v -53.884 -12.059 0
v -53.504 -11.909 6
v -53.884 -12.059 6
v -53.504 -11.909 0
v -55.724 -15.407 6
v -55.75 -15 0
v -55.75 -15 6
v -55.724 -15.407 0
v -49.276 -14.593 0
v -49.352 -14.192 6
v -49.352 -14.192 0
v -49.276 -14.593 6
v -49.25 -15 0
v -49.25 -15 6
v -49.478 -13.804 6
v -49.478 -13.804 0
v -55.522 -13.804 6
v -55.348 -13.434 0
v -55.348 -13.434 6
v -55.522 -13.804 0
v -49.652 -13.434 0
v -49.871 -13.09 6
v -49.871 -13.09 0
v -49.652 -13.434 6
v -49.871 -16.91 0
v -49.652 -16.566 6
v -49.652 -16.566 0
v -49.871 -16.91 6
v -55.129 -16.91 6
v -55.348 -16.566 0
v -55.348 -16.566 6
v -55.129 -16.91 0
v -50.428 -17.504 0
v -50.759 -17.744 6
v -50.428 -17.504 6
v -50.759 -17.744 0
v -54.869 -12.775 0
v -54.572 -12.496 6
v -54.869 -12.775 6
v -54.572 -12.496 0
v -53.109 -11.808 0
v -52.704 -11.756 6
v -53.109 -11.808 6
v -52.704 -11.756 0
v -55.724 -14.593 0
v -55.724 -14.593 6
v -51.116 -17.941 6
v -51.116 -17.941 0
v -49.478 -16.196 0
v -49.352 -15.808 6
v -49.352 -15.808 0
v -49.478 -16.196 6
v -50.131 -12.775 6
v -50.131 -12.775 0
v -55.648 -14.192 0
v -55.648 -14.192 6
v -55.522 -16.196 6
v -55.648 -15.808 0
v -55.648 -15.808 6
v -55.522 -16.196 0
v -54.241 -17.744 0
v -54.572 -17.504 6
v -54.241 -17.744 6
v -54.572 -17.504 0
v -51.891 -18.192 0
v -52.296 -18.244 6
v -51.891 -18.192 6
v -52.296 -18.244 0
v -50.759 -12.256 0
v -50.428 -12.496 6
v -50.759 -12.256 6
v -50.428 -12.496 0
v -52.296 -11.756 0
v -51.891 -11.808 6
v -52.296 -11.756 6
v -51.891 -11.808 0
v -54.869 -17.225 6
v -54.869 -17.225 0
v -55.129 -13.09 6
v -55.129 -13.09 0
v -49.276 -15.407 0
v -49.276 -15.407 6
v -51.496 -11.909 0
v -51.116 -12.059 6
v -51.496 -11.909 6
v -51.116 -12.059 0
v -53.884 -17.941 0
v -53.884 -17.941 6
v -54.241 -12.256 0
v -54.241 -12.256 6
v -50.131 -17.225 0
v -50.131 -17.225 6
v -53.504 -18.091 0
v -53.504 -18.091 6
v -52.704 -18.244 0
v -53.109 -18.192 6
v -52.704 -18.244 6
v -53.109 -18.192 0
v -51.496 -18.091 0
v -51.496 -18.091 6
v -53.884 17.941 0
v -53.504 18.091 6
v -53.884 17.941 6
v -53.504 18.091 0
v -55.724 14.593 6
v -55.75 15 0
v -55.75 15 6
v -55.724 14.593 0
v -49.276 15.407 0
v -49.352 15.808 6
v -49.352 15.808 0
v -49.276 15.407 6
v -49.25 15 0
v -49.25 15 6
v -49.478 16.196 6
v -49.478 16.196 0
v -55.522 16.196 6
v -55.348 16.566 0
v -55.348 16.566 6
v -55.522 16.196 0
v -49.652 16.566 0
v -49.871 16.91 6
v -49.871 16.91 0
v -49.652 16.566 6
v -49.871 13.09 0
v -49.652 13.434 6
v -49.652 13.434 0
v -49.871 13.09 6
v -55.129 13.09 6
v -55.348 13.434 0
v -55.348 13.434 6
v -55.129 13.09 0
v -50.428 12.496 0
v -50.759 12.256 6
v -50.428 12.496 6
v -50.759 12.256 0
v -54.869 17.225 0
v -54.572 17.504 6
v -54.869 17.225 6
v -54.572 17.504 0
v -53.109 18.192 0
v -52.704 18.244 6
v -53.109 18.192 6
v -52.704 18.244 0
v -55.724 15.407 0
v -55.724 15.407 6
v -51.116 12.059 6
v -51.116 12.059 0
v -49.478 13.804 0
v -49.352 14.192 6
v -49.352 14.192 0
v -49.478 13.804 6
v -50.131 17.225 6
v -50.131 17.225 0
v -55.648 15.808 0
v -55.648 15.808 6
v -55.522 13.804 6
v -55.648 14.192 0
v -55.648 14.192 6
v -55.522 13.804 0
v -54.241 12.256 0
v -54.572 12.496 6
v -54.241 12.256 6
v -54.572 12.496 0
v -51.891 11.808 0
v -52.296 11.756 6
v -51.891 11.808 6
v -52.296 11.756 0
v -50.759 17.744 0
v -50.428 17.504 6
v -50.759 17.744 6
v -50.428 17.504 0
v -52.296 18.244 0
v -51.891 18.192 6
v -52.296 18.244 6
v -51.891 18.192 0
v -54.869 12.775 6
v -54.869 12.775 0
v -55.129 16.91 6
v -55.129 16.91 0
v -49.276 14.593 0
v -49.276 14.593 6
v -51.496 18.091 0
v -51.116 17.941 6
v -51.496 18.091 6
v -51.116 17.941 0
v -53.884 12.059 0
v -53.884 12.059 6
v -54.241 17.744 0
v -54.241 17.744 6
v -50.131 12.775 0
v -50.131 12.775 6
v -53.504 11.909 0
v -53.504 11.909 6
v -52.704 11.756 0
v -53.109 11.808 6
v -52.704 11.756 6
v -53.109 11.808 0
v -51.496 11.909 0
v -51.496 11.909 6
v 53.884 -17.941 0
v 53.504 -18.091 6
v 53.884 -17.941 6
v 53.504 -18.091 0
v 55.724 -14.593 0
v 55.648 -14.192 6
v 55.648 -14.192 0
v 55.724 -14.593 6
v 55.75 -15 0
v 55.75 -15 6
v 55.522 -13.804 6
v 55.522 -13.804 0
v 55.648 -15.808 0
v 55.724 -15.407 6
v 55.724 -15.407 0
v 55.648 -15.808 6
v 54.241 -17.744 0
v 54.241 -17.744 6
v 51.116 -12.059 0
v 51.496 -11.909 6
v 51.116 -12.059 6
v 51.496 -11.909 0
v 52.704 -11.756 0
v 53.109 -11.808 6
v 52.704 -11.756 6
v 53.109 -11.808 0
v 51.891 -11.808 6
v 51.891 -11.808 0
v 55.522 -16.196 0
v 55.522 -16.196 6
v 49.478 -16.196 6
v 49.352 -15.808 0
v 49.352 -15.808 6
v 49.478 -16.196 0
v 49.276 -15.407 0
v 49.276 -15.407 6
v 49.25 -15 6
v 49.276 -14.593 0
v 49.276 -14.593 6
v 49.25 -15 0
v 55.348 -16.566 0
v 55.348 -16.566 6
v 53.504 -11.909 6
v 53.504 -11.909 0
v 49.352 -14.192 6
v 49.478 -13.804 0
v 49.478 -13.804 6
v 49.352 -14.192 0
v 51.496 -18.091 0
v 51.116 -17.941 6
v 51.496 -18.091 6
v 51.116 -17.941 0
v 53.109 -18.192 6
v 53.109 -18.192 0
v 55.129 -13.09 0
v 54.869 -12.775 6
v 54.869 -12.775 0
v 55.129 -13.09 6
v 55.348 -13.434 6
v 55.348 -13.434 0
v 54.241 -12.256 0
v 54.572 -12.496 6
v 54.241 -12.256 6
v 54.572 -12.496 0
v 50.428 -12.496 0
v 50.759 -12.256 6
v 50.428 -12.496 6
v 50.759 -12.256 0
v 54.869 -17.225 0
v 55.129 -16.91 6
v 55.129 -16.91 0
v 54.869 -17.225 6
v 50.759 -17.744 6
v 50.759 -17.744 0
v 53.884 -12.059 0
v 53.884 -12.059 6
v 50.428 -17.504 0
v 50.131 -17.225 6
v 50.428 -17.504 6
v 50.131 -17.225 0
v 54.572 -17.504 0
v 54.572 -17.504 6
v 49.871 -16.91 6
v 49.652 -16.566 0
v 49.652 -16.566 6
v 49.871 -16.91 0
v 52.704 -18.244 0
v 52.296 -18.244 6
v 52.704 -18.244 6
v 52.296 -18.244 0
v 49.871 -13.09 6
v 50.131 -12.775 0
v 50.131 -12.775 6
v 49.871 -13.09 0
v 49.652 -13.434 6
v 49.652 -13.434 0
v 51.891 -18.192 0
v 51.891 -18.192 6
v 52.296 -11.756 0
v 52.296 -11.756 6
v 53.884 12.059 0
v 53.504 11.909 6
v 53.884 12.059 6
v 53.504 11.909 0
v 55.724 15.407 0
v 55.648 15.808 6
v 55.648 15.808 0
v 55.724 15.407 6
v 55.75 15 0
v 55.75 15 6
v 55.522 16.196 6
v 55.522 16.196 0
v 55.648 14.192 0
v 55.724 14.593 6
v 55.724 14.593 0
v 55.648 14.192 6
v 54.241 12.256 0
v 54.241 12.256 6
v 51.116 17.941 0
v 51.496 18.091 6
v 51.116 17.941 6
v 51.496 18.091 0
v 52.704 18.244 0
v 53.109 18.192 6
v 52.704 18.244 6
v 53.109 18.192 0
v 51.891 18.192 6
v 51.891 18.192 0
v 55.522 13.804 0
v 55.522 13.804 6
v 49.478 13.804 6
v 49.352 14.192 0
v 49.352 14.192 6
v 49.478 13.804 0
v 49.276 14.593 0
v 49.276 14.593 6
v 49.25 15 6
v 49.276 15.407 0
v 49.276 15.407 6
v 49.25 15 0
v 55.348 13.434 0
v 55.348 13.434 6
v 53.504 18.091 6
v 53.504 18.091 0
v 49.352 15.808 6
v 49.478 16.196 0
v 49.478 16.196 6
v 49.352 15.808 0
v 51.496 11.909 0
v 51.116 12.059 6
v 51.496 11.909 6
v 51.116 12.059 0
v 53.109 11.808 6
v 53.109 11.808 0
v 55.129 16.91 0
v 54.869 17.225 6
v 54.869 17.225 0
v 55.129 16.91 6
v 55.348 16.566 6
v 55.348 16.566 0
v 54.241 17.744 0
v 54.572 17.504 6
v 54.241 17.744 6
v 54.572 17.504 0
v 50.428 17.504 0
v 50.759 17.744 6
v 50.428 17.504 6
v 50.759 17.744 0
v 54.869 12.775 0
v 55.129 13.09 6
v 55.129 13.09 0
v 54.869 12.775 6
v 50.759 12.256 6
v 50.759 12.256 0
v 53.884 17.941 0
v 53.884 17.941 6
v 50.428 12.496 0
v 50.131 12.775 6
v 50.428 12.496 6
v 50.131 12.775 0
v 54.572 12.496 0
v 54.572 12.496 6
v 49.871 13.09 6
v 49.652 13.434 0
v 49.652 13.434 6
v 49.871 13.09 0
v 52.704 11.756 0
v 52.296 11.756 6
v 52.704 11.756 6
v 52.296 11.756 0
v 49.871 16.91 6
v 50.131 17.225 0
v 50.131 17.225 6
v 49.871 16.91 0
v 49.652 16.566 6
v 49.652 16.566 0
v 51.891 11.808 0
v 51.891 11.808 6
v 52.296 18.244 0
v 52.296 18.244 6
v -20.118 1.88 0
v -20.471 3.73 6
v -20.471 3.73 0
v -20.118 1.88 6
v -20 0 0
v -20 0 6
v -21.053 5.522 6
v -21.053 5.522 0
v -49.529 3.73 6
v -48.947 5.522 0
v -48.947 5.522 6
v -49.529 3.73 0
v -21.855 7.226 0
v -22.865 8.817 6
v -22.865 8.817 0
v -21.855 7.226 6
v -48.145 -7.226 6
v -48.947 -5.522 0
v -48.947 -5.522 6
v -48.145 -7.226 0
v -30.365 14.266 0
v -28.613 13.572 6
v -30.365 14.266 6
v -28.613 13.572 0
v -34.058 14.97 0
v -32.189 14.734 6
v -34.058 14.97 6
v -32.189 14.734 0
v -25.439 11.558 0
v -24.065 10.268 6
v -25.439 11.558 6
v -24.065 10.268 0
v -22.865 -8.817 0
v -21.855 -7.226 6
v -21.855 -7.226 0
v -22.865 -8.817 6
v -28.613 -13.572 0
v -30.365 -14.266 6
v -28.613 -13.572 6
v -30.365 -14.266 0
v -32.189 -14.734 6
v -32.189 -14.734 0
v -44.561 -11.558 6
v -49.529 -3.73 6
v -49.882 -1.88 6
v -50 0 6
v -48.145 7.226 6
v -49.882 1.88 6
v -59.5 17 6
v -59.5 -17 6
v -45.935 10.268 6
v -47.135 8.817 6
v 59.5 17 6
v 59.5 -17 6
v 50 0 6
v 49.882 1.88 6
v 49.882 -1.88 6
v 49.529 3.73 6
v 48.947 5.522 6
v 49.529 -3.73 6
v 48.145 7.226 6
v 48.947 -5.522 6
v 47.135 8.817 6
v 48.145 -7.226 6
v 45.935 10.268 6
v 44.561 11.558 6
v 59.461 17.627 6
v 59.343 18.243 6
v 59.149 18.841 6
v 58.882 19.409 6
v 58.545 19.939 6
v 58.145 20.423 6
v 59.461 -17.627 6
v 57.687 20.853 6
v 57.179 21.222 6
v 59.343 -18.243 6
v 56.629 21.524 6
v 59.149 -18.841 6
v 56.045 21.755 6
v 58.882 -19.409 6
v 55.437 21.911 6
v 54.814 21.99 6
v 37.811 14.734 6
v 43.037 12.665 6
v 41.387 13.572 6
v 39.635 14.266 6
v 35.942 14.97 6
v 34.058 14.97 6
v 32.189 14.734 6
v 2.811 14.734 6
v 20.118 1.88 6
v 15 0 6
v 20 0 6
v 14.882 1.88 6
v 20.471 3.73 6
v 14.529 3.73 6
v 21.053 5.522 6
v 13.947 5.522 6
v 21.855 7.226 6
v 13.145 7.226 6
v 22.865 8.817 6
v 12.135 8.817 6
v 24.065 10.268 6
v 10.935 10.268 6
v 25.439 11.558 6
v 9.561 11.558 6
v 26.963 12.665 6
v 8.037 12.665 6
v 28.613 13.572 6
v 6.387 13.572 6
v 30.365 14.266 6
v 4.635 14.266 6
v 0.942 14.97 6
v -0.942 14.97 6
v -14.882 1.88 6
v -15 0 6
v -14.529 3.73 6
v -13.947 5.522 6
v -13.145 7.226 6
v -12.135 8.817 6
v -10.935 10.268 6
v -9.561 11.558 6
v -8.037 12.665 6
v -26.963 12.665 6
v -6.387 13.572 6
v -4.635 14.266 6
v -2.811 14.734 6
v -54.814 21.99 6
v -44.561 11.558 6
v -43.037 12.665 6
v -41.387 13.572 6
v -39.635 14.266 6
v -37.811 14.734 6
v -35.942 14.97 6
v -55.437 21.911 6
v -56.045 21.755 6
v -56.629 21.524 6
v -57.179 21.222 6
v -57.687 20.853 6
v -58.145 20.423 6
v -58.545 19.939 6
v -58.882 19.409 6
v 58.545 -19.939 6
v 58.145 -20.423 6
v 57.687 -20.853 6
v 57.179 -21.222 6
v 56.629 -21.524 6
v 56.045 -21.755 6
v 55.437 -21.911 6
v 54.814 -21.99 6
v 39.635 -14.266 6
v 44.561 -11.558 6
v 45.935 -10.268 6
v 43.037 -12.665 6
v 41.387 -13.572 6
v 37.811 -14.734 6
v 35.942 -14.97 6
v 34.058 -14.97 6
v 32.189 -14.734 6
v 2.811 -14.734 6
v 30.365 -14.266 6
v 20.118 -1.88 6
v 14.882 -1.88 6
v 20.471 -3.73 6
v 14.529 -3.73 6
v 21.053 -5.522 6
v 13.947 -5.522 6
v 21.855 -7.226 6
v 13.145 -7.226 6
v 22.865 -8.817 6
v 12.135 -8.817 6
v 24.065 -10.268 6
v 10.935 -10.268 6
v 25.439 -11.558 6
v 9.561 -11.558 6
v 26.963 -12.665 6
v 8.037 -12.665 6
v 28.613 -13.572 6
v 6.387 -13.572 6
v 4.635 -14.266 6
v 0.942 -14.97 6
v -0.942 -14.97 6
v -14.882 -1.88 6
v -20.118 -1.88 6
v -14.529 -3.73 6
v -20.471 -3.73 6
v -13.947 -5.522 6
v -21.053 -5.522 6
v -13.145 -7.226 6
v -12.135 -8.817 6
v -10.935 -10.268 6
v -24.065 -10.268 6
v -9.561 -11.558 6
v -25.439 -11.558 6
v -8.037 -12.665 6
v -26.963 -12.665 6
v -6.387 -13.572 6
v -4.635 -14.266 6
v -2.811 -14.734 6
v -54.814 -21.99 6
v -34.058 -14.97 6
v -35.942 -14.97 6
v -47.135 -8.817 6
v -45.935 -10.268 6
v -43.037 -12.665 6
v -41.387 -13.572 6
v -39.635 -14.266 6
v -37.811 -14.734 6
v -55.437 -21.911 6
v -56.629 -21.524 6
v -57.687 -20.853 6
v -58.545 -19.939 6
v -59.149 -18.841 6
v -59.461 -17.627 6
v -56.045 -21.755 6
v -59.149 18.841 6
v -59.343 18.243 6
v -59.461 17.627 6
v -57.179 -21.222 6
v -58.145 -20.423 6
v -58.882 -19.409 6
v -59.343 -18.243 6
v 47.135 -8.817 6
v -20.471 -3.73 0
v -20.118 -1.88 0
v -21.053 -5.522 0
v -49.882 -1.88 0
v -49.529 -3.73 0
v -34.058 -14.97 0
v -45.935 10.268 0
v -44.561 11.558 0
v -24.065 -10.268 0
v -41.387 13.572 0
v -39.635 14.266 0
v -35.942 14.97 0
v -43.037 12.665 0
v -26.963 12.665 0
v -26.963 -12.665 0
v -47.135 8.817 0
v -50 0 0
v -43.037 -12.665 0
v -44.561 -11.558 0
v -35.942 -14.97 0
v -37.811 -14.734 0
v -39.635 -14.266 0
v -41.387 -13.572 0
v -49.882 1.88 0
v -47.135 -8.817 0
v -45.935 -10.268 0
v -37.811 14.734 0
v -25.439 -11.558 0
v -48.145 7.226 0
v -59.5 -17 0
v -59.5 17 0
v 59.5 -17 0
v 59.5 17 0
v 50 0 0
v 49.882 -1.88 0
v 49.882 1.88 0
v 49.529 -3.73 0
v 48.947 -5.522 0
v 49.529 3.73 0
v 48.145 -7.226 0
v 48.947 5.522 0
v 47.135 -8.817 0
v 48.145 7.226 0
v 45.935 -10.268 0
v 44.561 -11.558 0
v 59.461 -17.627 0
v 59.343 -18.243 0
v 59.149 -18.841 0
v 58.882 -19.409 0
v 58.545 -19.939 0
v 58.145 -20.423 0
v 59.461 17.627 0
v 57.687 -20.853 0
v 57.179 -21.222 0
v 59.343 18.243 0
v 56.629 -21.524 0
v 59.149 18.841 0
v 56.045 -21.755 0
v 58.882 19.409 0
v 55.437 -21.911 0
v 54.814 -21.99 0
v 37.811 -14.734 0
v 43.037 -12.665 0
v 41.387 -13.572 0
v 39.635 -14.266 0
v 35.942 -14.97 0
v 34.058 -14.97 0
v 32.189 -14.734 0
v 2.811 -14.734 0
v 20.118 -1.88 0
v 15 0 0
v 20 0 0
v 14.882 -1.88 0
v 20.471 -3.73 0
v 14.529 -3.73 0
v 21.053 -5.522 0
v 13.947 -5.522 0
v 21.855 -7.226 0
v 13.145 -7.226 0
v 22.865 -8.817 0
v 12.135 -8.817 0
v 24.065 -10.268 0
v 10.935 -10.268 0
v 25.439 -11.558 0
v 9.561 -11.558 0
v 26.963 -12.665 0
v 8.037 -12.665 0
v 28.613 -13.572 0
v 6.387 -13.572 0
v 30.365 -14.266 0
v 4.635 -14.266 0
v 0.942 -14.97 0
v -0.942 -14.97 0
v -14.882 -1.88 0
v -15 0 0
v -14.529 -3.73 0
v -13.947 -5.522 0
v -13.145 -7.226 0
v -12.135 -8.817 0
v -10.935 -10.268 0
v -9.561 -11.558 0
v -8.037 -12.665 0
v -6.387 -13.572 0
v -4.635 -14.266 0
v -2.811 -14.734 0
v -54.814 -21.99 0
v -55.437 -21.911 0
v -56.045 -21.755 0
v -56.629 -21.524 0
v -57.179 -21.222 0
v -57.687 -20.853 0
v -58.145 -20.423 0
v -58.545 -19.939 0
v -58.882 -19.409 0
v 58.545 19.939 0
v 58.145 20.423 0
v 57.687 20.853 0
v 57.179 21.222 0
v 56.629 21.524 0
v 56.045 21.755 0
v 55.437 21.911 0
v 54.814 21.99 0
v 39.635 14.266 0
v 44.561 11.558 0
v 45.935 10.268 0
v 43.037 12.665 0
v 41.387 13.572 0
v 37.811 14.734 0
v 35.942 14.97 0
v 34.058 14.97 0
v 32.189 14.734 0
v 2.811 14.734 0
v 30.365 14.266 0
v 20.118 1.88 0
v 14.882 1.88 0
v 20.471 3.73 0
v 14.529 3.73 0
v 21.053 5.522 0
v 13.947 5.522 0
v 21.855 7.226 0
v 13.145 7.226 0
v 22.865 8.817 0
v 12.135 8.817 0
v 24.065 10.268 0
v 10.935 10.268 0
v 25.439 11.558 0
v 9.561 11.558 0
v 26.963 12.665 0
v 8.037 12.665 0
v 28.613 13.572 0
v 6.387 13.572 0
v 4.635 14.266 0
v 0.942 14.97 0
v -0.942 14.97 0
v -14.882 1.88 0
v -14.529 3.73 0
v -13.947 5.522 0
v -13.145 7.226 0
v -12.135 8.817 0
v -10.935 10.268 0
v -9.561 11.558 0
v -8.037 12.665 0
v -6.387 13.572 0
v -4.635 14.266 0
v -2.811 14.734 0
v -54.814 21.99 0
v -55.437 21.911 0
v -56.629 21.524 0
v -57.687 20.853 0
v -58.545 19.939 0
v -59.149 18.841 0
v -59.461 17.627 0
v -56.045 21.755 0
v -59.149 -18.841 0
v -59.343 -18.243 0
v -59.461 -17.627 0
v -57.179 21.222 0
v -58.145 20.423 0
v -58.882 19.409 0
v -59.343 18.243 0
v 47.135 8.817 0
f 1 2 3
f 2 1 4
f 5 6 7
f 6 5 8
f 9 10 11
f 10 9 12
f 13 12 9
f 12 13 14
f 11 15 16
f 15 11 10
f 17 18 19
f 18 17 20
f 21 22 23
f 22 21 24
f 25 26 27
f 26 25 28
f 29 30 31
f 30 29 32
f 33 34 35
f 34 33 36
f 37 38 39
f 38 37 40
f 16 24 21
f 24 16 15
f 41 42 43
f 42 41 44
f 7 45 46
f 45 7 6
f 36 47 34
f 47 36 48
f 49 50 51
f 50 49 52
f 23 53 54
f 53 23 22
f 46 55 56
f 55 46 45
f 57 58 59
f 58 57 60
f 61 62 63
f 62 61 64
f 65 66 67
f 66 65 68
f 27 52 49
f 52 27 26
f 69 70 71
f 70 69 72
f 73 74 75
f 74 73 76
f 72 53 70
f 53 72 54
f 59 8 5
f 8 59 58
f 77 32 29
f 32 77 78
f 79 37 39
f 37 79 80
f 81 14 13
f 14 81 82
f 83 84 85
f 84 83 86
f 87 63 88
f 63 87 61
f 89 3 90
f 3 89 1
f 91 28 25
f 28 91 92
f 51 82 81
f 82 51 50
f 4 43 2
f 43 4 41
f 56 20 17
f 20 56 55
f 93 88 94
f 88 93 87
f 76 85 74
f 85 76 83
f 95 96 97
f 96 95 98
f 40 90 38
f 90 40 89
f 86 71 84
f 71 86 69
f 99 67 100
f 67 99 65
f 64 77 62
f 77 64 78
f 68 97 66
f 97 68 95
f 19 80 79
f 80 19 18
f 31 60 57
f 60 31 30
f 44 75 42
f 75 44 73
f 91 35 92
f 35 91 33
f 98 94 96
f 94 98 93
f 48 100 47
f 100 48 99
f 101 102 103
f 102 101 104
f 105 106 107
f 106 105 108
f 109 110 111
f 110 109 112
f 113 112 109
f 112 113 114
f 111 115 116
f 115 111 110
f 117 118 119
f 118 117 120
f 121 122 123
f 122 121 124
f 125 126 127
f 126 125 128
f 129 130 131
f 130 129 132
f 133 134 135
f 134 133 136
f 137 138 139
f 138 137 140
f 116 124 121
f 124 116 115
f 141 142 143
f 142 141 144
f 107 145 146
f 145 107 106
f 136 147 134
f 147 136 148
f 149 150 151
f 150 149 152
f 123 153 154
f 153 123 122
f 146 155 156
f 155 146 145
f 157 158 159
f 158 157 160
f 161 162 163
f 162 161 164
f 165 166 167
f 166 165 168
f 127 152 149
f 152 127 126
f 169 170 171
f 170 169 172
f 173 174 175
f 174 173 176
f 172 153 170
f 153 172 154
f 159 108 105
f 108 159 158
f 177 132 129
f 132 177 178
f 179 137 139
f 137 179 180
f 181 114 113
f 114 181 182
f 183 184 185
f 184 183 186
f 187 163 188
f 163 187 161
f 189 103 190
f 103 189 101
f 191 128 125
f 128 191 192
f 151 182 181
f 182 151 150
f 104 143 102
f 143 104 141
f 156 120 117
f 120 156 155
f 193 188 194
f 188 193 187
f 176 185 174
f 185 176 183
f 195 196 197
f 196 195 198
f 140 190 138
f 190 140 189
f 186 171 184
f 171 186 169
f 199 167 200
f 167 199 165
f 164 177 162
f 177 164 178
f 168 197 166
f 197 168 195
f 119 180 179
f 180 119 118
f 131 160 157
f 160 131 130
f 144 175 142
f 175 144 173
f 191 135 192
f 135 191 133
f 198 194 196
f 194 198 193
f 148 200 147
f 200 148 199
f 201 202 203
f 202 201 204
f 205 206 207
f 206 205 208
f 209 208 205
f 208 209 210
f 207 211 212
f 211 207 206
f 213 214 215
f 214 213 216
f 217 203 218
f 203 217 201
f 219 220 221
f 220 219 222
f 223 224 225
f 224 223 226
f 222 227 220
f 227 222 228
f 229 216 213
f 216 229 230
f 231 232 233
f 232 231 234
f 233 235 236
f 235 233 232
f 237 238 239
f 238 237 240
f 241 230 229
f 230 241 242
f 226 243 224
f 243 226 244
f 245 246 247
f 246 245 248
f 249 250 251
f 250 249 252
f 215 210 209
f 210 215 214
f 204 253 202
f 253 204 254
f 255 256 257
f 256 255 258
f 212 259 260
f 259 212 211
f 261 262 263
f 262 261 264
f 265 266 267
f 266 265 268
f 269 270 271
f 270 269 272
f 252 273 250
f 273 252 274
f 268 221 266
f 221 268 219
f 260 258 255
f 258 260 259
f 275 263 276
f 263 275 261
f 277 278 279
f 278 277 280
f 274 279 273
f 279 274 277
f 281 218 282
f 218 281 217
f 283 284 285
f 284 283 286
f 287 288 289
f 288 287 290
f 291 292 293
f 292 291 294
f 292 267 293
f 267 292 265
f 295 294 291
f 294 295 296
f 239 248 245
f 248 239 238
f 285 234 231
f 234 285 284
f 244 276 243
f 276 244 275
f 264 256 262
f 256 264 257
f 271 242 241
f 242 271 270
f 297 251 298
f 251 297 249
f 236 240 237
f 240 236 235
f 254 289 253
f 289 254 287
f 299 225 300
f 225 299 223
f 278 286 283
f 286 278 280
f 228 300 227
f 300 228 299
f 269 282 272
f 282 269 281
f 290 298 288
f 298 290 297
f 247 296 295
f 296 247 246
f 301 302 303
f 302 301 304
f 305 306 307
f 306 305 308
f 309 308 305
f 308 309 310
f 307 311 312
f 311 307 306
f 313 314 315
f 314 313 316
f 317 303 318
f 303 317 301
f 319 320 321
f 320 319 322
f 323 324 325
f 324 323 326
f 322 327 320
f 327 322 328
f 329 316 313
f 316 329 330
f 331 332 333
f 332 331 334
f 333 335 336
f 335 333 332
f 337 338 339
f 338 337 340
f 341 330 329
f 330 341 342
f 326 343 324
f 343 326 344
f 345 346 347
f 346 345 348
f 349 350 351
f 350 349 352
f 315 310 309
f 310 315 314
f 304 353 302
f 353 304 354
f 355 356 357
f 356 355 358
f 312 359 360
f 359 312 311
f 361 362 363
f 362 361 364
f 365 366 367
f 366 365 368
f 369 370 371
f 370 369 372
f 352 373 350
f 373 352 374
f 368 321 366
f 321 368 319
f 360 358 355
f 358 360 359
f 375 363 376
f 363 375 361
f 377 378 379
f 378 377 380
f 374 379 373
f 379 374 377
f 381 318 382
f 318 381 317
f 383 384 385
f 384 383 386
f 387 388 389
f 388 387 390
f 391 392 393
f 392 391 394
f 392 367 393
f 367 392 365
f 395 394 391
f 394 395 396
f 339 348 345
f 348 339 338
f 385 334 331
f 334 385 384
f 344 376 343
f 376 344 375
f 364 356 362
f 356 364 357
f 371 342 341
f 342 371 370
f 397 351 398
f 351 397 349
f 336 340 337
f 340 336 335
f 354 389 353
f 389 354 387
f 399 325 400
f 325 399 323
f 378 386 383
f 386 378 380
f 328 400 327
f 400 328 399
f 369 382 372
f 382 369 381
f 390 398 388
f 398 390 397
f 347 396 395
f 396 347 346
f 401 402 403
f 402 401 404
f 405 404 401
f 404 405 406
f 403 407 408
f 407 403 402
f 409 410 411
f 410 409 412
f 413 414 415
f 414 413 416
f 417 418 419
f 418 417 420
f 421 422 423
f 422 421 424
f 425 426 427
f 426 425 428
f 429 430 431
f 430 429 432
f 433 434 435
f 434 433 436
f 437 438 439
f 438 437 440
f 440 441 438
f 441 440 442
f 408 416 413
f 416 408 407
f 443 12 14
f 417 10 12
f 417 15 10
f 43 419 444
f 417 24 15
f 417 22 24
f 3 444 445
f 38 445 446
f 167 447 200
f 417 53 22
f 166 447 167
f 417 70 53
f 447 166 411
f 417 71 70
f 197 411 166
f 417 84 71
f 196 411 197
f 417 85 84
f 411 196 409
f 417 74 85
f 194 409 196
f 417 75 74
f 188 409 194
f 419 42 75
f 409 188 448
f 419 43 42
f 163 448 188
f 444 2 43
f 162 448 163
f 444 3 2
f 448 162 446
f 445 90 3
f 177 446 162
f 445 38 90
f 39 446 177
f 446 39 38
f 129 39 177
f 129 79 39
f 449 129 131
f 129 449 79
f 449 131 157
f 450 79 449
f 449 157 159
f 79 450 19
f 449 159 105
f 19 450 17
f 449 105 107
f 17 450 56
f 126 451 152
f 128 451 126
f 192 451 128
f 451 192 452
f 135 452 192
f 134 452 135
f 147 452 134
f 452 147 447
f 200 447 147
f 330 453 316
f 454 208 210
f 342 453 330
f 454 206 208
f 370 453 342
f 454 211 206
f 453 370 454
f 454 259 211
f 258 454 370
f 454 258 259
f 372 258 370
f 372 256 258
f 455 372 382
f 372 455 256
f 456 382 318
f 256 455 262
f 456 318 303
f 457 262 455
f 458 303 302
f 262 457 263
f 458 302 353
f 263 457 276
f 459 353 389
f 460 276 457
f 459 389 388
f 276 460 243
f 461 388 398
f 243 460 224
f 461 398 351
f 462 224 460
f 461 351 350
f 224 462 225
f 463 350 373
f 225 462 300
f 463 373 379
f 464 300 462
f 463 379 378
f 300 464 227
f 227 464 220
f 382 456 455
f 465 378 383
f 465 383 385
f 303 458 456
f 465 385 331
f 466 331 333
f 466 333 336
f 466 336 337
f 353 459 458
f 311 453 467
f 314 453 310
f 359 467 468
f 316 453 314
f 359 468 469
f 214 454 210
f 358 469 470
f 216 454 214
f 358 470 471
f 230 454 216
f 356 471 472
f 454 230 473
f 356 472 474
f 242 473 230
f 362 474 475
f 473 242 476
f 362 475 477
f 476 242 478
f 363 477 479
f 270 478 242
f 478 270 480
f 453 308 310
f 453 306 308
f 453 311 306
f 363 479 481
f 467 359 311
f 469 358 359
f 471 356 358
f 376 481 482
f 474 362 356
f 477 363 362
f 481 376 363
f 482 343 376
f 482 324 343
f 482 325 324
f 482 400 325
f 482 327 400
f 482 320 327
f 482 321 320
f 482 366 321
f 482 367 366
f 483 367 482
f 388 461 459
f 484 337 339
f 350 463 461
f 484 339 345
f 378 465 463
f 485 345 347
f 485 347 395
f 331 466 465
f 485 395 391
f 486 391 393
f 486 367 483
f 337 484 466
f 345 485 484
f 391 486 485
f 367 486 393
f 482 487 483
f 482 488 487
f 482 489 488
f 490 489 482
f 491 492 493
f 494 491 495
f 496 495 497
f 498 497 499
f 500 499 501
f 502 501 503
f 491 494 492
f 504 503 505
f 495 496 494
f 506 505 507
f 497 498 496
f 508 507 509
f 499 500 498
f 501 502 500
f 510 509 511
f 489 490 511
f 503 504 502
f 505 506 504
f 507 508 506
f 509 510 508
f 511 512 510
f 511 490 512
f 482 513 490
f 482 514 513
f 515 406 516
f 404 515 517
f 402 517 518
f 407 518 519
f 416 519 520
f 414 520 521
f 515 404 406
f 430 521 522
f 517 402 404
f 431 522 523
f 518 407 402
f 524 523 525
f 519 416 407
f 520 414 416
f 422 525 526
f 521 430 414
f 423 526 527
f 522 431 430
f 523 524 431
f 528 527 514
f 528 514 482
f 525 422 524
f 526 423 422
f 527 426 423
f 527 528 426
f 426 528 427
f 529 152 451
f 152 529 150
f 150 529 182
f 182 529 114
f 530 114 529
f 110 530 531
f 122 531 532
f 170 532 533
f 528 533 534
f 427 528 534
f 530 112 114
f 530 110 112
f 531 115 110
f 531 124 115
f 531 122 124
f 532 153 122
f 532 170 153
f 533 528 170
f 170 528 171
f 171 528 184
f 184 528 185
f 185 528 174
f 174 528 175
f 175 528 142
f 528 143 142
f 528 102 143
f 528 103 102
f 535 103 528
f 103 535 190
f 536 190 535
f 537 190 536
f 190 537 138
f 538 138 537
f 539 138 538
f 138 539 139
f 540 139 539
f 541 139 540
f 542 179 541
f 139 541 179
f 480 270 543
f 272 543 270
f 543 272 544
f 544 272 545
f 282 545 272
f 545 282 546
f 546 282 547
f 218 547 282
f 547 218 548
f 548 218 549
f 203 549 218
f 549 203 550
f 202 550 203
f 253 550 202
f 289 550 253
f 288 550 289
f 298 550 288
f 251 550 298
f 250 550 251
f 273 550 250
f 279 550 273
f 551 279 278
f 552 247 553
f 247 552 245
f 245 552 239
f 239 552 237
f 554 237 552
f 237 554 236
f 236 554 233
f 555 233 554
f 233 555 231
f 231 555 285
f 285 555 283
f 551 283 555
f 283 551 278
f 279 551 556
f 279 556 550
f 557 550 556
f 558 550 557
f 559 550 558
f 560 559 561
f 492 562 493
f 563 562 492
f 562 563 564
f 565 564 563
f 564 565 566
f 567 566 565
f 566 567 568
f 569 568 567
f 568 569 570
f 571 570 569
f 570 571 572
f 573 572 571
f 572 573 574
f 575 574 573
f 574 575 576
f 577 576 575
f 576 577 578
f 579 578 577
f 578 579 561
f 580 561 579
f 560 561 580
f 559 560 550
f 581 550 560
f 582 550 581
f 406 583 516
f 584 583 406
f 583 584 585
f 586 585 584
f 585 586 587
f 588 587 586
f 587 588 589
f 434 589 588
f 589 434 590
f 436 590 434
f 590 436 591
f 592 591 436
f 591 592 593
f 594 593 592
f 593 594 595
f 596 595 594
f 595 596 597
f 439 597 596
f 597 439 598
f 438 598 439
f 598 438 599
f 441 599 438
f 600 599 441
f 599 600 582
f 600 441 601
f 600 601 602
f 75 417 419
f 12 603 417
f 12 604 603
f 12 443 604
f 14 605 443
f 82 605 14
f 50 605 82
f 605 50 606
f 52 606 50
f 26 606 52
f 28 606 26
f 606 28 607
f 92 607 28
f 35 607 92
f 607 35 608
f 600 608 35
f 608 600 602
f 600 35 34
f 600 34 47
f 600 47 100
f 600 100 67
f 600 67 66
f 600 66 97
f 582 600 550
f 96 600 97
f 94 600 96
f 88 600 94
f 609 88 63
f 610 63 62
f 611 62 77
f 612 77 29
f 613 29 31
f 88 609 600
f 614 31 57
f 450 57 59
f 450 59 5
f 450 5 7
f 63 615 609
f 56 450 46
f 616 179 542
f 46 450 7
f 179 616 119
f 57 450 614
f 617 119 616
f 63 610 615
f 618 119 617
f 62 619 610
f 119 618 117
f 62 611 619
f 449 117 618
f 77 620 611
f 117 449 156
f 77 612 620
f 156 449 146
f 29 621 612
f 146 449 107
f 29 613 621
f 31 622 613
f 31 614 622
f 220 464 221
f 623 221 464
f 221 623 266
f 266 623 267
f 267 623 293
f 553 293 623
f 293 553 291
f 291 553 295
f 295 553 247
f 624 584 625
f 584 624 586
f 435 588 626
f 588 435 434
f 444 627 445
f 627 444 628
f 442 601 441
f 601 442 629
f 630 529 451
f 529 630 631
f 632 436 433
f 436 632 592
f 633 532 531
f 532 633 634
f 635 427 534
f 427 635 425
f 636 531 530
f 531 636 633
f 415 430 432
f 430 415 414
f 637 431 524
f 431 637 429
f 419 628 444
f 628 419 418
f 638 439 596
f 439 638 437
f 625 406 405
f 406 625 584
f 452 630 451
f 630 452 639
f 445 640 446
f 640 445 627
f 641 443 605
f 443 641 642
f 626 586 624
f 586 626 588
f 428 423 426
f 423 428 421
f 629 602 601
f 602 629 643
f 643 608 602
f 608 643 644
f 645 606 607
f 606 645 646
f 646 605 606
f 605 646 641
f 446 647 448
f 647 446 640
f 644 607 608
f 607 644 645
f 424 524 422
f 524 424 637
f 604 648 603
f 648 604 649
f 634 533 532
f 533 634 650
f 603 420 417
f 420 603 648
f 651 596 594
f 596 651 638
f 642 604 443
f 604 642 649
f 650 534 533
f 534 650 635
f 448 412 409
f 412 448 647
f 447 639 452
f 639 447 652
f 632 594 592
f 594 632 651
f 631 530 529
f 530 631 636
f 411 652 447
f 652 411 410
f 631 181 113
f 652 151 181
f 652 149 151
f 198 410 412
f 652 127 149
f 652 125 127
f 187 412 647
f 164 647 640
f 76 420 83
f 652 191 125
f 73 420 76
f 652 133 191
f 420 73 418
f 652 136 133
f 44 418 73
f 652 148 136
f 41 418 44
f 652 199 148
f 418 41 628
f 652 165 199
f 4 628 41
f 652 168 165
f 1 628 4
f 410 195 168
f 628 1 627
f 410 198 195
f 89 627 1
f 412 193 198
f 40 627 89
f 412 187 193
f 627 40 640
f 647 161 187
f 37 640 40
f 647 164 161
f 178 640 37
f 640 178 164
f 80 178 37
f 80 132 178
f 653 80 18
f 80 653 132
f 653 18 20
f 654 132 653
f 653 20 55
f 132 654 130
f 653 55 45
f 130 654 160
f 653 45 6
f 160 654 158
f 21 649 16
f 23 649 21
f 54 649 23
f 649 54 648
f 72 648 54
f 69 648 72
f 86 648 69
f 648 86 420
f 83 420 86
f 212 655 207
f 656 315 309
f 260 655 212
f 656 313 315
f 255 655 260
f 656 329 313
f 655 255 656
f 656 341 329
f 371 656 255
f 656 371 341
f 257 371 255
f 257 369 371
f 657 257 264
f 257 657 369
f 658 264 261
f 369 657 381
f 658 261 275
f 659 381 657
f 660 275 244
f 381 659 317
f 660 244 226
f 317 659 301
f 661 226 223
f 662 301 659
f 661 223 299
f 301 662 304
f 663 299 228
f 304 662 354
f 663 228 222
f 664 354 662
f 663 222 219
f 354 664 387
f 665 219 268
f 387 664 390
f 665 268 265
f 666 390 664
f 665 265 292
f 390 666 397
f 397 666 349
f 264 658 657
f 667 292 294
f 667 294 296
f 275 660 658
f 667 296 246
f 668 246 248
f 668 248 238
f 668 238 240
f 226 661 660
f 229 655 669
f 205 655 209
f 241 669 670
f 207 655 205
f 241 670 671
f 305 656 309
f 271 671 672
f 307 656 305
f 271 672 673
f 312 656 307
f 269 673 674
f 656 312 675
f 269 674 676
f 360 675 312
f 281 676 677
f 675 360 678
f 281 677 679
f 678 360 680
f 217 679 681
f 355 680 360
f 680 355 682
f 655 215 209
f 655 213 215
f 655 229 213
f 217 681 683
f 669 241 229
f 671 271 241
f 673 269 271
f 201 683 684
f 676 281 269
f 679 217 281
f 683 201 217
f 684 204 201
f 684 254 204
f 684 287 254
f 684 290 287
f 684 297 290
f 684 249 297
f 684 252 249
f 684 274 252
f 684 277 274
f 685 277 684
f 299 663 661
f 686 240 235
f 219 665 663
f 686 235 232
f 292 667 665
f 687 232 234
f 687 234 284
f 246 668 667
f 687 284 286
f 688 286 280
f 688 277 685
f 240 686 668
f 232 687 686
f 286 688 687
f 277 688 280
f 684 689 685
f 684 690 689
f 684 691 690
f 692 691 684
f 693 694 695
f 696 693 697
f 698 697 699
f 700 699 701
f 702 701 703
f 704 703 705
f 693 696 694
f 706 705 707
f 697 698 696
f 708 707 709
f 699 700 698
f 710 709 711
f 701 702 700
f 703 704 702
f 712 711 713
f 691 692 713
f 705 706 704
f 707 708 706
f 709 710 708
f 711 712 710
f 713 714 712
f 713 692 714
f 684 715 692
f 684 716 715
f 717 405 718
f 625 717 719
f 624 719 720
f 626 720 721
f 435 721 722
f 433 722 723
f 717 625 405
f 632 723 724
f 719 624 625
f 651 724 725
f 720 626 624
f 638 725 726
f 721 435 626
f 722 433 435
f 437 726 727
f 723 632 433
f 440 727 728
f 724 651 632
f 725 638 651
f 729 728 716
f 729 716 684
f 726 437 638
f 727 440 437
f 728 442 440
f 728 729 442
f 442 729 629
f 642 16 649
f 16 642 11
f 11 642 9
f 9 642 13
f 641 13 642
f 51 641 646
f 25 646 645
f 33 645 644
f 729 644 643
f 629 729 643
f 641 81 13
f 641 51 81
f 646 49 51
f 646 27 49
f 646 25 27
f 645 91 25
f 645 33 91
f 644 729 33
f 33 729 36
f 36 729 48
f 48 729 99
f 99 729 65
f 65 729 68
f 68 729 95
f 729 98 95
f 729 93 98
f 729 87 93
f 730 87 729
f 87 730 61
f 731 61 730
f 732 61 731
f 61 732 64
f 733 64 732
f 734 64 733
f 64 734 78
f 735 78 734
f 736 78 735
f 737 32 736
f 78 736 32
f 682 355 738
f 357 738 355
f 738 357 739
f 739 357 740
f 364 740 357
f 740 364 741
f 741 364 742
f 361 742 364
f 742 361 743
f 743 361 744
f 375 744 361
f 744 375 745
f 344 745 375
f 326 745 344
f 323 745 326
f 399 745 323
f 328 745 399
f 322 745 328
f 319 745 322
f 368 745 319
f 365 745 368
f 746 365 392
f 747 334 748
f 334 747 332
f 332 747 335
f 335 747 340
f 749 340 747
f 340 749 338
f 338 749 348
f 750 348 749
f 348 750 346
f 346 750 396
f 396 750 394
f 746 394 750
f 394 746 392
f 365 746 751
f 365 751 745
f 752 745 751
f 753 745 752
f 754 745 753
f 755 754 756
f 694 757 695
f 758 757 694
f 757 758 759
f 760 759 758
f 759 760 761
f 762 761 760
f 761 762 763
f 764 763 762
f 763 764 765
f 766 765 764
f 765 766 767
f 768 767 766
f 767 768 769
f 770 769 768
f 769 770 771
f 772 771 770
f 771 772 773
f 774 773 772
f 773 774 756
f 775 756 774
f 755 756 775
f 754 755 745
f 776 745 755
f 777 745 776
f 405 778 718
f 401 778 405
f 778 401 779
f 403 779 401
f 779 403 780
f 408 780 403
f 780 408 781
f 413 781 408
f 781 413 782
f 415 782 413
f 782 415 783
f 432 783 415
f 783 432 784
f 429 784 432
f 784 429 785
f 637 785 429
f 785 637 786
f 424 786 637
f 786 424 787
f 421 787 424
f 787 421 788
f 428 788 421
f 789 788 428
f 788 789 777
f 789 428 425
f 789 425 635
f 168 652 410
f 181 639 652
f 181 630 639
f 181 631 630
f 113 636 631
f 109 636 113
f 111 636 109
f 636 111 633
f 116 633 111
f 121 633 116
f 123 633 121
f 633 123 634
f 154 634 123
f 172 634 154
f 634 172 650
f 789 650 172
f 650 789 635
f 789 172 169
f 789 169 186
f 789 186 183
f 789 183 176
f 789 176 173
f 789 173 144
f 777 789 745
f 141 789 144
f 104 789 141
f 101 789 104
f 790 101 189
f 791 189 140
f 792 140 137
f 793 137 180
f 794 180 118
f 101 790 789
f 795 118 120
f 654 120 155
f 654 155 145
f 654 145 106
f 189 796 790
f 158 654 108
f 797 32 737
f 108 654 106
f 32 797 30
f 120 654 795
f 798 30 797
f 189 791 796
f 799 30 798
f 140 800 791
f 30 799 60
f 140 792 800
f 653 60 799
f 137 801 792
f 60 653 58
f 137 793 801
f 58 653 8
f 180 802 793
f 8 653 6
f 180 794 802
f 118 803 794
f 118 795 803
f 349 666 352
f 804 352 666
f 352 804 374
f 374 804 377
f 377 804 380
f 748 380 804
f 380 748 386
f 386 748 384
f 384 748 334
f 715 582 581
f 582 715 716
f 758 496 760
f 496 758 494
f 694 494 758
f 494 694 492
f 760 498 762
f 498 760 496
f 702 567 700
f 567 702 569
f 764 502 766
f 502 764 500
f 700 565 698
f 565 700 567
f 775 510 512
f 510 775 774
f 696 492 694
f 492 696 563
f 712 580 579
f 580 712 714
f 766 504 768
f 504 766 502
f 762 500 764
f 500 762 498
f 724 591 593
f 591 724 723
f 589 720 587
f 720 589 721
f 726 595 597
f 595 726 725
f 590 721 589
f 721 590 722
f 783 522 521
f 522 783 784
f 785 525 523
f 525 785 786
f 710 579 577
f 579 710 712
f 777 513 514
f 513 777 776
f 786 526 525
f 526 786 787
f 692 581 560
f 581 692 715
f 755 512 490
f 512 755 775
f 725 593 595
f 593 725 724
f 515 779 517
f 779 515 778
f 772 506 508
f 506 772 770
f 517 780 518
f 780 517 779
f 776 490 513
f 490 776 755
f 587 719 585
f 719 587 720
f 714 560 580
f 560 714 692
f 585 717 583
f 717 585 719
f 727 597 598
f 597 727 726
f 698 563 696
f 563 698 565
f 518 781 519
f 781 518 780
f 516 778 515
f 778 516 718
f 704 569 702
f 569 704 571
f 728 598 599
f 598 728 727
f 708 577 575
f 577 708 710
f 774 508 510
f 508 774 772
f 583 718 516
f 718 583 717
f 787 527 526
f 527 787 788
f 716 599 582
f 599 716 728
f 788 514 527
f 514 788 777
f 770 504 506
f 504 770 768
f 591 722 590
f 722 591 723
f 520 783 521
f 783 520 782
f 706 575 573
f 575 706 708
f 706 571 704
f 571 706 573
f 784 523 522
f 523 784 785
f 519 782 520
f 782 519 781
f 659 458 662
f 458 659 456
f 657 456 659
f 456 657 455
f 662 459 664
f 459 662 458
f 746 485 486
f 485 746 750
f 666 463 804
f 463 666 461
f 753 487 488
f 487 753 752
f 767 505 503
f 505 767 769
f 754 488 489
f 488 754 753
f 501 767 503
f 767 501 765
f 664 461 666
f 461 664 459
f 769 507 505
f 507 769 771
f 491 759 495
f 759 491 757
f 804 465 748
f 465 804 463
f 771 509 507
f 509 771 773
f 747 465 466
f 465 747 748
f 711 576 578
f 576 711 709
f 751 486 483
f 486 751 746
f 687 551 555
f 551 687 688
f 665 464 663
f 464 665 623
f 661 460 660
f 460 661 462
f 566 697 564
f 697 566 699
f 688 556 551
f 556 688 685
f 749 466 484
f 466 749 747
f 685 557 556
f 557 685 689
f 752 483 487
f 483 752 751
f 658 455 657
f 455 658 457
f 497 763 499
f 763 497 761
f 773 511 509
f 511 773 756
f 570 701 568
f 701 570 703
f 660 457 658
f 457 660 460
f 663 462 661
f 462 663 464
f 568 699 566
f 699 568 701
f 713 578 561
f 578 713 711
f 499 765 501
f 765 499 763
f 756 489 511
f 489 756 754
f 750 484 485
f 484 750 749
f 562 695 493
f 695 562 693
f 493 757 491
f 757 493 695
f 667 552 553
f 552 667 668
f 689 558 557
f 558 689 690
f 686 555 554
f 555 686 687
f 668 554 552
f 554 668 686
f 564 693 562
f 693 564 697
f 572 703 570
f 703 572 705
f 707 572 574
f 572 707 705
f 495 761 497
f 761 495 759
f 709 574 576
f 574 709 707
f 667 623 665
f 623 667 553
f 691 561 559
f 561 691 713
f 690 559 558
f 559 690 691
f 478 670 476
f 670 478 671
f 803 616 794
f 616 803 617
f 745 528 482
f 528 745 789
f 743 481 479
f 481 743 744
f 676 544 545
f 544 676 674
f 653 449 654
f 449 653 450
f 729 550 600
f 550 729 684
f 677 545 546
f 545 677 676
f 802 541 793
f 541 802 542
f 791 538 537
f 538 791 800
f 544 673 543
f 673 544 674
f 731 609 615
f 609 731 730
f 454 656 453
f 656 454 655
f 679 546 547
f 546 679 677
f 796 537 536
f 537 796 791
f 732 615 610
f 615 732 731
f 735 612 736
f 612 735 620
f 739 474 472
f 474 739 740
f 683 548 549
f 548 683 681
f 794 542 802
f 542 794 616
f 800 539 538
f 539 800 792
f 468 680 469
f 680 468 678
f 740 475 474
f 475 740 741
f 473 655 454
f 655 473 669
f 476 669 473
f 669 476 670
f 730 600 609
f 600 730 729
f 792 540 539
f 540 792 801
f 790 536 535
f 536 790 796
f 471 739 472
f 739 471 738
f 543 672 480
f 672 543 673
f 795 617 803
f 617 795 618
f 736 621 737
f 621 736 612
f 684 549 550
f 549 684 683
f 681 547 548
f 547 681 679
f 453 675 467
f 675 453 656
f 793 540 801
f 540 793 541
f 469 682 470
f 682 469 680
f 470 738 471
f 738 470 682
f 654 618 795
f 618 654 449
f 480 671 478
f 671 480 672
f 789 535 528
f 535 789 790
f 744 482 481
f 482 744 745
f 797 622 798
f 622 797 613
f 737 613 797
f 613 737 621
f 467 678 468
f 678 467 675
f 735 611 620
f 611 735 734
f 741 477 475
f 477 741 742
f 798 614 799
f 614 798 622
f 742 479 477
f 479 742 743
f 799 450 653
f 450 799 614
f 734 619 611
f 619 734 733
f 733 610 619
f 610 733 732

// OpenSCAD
$fn = 50;

difference() {
	union() {
		hull() {
			translate(v = [-54.5, 17.0, 0]) {
				cylinder(h = 6, r = 5);
			}
			translate(v = [54.5, 17.0, 0]) {
				cylinder(h = 6, r = 5);
			}
			translate(v = [-54.5, -17.0, 0]) {
				cylinder(h = 6, r = 5);
			}
			translate(v = [54.5, -17.0, 0]) {
				cylinder(h = 6, r = 5);
			}
		}
	}
	union() {
		translate(v = [-52.5, -15.0, -100.0]) {
			cylinder(h = 200, r = 3.25);
		}
		translate(v = [-52.5, 15.0, -100.0]) {
			cylinder(h = 200, r = 3.25);
		}
		translate(v = [52.5, -15.0, -100.0]) {
			cylinder(h = 200, r = 3.25);
		}
		translate(v = [52.5, 15.0, -100.0]) {
			cylinder(h = 200, r = 3.25);
		}
		translate(v = [-52.5, -15.0, -100.0]) {
			cylinder(h = 200, r = 1.8);
		}
		translate(v = [-52.5, 15.0, -100.0]) {
			cylinder(h = 200, r = 1.8);
		}
		translate(v = [52.5, -15.0, -100.0]) {
			cylinder(h = 200, r = 1.8);
		}
		translate(v = [52.5, 15.0, -100.0]) {
			cylinder(h = 200, r = 1.8);
		}
		translate(v = [-35.0, 0, 0.0]) {
			cylinder(h = 6, r = 15.0);
		}
		cylinder(h = 6, r = 15.0);
		translate(v = [35.0, 0, 0.0]) {
			cylinder(h = 6, r = 15.0);
		}
	}
}
